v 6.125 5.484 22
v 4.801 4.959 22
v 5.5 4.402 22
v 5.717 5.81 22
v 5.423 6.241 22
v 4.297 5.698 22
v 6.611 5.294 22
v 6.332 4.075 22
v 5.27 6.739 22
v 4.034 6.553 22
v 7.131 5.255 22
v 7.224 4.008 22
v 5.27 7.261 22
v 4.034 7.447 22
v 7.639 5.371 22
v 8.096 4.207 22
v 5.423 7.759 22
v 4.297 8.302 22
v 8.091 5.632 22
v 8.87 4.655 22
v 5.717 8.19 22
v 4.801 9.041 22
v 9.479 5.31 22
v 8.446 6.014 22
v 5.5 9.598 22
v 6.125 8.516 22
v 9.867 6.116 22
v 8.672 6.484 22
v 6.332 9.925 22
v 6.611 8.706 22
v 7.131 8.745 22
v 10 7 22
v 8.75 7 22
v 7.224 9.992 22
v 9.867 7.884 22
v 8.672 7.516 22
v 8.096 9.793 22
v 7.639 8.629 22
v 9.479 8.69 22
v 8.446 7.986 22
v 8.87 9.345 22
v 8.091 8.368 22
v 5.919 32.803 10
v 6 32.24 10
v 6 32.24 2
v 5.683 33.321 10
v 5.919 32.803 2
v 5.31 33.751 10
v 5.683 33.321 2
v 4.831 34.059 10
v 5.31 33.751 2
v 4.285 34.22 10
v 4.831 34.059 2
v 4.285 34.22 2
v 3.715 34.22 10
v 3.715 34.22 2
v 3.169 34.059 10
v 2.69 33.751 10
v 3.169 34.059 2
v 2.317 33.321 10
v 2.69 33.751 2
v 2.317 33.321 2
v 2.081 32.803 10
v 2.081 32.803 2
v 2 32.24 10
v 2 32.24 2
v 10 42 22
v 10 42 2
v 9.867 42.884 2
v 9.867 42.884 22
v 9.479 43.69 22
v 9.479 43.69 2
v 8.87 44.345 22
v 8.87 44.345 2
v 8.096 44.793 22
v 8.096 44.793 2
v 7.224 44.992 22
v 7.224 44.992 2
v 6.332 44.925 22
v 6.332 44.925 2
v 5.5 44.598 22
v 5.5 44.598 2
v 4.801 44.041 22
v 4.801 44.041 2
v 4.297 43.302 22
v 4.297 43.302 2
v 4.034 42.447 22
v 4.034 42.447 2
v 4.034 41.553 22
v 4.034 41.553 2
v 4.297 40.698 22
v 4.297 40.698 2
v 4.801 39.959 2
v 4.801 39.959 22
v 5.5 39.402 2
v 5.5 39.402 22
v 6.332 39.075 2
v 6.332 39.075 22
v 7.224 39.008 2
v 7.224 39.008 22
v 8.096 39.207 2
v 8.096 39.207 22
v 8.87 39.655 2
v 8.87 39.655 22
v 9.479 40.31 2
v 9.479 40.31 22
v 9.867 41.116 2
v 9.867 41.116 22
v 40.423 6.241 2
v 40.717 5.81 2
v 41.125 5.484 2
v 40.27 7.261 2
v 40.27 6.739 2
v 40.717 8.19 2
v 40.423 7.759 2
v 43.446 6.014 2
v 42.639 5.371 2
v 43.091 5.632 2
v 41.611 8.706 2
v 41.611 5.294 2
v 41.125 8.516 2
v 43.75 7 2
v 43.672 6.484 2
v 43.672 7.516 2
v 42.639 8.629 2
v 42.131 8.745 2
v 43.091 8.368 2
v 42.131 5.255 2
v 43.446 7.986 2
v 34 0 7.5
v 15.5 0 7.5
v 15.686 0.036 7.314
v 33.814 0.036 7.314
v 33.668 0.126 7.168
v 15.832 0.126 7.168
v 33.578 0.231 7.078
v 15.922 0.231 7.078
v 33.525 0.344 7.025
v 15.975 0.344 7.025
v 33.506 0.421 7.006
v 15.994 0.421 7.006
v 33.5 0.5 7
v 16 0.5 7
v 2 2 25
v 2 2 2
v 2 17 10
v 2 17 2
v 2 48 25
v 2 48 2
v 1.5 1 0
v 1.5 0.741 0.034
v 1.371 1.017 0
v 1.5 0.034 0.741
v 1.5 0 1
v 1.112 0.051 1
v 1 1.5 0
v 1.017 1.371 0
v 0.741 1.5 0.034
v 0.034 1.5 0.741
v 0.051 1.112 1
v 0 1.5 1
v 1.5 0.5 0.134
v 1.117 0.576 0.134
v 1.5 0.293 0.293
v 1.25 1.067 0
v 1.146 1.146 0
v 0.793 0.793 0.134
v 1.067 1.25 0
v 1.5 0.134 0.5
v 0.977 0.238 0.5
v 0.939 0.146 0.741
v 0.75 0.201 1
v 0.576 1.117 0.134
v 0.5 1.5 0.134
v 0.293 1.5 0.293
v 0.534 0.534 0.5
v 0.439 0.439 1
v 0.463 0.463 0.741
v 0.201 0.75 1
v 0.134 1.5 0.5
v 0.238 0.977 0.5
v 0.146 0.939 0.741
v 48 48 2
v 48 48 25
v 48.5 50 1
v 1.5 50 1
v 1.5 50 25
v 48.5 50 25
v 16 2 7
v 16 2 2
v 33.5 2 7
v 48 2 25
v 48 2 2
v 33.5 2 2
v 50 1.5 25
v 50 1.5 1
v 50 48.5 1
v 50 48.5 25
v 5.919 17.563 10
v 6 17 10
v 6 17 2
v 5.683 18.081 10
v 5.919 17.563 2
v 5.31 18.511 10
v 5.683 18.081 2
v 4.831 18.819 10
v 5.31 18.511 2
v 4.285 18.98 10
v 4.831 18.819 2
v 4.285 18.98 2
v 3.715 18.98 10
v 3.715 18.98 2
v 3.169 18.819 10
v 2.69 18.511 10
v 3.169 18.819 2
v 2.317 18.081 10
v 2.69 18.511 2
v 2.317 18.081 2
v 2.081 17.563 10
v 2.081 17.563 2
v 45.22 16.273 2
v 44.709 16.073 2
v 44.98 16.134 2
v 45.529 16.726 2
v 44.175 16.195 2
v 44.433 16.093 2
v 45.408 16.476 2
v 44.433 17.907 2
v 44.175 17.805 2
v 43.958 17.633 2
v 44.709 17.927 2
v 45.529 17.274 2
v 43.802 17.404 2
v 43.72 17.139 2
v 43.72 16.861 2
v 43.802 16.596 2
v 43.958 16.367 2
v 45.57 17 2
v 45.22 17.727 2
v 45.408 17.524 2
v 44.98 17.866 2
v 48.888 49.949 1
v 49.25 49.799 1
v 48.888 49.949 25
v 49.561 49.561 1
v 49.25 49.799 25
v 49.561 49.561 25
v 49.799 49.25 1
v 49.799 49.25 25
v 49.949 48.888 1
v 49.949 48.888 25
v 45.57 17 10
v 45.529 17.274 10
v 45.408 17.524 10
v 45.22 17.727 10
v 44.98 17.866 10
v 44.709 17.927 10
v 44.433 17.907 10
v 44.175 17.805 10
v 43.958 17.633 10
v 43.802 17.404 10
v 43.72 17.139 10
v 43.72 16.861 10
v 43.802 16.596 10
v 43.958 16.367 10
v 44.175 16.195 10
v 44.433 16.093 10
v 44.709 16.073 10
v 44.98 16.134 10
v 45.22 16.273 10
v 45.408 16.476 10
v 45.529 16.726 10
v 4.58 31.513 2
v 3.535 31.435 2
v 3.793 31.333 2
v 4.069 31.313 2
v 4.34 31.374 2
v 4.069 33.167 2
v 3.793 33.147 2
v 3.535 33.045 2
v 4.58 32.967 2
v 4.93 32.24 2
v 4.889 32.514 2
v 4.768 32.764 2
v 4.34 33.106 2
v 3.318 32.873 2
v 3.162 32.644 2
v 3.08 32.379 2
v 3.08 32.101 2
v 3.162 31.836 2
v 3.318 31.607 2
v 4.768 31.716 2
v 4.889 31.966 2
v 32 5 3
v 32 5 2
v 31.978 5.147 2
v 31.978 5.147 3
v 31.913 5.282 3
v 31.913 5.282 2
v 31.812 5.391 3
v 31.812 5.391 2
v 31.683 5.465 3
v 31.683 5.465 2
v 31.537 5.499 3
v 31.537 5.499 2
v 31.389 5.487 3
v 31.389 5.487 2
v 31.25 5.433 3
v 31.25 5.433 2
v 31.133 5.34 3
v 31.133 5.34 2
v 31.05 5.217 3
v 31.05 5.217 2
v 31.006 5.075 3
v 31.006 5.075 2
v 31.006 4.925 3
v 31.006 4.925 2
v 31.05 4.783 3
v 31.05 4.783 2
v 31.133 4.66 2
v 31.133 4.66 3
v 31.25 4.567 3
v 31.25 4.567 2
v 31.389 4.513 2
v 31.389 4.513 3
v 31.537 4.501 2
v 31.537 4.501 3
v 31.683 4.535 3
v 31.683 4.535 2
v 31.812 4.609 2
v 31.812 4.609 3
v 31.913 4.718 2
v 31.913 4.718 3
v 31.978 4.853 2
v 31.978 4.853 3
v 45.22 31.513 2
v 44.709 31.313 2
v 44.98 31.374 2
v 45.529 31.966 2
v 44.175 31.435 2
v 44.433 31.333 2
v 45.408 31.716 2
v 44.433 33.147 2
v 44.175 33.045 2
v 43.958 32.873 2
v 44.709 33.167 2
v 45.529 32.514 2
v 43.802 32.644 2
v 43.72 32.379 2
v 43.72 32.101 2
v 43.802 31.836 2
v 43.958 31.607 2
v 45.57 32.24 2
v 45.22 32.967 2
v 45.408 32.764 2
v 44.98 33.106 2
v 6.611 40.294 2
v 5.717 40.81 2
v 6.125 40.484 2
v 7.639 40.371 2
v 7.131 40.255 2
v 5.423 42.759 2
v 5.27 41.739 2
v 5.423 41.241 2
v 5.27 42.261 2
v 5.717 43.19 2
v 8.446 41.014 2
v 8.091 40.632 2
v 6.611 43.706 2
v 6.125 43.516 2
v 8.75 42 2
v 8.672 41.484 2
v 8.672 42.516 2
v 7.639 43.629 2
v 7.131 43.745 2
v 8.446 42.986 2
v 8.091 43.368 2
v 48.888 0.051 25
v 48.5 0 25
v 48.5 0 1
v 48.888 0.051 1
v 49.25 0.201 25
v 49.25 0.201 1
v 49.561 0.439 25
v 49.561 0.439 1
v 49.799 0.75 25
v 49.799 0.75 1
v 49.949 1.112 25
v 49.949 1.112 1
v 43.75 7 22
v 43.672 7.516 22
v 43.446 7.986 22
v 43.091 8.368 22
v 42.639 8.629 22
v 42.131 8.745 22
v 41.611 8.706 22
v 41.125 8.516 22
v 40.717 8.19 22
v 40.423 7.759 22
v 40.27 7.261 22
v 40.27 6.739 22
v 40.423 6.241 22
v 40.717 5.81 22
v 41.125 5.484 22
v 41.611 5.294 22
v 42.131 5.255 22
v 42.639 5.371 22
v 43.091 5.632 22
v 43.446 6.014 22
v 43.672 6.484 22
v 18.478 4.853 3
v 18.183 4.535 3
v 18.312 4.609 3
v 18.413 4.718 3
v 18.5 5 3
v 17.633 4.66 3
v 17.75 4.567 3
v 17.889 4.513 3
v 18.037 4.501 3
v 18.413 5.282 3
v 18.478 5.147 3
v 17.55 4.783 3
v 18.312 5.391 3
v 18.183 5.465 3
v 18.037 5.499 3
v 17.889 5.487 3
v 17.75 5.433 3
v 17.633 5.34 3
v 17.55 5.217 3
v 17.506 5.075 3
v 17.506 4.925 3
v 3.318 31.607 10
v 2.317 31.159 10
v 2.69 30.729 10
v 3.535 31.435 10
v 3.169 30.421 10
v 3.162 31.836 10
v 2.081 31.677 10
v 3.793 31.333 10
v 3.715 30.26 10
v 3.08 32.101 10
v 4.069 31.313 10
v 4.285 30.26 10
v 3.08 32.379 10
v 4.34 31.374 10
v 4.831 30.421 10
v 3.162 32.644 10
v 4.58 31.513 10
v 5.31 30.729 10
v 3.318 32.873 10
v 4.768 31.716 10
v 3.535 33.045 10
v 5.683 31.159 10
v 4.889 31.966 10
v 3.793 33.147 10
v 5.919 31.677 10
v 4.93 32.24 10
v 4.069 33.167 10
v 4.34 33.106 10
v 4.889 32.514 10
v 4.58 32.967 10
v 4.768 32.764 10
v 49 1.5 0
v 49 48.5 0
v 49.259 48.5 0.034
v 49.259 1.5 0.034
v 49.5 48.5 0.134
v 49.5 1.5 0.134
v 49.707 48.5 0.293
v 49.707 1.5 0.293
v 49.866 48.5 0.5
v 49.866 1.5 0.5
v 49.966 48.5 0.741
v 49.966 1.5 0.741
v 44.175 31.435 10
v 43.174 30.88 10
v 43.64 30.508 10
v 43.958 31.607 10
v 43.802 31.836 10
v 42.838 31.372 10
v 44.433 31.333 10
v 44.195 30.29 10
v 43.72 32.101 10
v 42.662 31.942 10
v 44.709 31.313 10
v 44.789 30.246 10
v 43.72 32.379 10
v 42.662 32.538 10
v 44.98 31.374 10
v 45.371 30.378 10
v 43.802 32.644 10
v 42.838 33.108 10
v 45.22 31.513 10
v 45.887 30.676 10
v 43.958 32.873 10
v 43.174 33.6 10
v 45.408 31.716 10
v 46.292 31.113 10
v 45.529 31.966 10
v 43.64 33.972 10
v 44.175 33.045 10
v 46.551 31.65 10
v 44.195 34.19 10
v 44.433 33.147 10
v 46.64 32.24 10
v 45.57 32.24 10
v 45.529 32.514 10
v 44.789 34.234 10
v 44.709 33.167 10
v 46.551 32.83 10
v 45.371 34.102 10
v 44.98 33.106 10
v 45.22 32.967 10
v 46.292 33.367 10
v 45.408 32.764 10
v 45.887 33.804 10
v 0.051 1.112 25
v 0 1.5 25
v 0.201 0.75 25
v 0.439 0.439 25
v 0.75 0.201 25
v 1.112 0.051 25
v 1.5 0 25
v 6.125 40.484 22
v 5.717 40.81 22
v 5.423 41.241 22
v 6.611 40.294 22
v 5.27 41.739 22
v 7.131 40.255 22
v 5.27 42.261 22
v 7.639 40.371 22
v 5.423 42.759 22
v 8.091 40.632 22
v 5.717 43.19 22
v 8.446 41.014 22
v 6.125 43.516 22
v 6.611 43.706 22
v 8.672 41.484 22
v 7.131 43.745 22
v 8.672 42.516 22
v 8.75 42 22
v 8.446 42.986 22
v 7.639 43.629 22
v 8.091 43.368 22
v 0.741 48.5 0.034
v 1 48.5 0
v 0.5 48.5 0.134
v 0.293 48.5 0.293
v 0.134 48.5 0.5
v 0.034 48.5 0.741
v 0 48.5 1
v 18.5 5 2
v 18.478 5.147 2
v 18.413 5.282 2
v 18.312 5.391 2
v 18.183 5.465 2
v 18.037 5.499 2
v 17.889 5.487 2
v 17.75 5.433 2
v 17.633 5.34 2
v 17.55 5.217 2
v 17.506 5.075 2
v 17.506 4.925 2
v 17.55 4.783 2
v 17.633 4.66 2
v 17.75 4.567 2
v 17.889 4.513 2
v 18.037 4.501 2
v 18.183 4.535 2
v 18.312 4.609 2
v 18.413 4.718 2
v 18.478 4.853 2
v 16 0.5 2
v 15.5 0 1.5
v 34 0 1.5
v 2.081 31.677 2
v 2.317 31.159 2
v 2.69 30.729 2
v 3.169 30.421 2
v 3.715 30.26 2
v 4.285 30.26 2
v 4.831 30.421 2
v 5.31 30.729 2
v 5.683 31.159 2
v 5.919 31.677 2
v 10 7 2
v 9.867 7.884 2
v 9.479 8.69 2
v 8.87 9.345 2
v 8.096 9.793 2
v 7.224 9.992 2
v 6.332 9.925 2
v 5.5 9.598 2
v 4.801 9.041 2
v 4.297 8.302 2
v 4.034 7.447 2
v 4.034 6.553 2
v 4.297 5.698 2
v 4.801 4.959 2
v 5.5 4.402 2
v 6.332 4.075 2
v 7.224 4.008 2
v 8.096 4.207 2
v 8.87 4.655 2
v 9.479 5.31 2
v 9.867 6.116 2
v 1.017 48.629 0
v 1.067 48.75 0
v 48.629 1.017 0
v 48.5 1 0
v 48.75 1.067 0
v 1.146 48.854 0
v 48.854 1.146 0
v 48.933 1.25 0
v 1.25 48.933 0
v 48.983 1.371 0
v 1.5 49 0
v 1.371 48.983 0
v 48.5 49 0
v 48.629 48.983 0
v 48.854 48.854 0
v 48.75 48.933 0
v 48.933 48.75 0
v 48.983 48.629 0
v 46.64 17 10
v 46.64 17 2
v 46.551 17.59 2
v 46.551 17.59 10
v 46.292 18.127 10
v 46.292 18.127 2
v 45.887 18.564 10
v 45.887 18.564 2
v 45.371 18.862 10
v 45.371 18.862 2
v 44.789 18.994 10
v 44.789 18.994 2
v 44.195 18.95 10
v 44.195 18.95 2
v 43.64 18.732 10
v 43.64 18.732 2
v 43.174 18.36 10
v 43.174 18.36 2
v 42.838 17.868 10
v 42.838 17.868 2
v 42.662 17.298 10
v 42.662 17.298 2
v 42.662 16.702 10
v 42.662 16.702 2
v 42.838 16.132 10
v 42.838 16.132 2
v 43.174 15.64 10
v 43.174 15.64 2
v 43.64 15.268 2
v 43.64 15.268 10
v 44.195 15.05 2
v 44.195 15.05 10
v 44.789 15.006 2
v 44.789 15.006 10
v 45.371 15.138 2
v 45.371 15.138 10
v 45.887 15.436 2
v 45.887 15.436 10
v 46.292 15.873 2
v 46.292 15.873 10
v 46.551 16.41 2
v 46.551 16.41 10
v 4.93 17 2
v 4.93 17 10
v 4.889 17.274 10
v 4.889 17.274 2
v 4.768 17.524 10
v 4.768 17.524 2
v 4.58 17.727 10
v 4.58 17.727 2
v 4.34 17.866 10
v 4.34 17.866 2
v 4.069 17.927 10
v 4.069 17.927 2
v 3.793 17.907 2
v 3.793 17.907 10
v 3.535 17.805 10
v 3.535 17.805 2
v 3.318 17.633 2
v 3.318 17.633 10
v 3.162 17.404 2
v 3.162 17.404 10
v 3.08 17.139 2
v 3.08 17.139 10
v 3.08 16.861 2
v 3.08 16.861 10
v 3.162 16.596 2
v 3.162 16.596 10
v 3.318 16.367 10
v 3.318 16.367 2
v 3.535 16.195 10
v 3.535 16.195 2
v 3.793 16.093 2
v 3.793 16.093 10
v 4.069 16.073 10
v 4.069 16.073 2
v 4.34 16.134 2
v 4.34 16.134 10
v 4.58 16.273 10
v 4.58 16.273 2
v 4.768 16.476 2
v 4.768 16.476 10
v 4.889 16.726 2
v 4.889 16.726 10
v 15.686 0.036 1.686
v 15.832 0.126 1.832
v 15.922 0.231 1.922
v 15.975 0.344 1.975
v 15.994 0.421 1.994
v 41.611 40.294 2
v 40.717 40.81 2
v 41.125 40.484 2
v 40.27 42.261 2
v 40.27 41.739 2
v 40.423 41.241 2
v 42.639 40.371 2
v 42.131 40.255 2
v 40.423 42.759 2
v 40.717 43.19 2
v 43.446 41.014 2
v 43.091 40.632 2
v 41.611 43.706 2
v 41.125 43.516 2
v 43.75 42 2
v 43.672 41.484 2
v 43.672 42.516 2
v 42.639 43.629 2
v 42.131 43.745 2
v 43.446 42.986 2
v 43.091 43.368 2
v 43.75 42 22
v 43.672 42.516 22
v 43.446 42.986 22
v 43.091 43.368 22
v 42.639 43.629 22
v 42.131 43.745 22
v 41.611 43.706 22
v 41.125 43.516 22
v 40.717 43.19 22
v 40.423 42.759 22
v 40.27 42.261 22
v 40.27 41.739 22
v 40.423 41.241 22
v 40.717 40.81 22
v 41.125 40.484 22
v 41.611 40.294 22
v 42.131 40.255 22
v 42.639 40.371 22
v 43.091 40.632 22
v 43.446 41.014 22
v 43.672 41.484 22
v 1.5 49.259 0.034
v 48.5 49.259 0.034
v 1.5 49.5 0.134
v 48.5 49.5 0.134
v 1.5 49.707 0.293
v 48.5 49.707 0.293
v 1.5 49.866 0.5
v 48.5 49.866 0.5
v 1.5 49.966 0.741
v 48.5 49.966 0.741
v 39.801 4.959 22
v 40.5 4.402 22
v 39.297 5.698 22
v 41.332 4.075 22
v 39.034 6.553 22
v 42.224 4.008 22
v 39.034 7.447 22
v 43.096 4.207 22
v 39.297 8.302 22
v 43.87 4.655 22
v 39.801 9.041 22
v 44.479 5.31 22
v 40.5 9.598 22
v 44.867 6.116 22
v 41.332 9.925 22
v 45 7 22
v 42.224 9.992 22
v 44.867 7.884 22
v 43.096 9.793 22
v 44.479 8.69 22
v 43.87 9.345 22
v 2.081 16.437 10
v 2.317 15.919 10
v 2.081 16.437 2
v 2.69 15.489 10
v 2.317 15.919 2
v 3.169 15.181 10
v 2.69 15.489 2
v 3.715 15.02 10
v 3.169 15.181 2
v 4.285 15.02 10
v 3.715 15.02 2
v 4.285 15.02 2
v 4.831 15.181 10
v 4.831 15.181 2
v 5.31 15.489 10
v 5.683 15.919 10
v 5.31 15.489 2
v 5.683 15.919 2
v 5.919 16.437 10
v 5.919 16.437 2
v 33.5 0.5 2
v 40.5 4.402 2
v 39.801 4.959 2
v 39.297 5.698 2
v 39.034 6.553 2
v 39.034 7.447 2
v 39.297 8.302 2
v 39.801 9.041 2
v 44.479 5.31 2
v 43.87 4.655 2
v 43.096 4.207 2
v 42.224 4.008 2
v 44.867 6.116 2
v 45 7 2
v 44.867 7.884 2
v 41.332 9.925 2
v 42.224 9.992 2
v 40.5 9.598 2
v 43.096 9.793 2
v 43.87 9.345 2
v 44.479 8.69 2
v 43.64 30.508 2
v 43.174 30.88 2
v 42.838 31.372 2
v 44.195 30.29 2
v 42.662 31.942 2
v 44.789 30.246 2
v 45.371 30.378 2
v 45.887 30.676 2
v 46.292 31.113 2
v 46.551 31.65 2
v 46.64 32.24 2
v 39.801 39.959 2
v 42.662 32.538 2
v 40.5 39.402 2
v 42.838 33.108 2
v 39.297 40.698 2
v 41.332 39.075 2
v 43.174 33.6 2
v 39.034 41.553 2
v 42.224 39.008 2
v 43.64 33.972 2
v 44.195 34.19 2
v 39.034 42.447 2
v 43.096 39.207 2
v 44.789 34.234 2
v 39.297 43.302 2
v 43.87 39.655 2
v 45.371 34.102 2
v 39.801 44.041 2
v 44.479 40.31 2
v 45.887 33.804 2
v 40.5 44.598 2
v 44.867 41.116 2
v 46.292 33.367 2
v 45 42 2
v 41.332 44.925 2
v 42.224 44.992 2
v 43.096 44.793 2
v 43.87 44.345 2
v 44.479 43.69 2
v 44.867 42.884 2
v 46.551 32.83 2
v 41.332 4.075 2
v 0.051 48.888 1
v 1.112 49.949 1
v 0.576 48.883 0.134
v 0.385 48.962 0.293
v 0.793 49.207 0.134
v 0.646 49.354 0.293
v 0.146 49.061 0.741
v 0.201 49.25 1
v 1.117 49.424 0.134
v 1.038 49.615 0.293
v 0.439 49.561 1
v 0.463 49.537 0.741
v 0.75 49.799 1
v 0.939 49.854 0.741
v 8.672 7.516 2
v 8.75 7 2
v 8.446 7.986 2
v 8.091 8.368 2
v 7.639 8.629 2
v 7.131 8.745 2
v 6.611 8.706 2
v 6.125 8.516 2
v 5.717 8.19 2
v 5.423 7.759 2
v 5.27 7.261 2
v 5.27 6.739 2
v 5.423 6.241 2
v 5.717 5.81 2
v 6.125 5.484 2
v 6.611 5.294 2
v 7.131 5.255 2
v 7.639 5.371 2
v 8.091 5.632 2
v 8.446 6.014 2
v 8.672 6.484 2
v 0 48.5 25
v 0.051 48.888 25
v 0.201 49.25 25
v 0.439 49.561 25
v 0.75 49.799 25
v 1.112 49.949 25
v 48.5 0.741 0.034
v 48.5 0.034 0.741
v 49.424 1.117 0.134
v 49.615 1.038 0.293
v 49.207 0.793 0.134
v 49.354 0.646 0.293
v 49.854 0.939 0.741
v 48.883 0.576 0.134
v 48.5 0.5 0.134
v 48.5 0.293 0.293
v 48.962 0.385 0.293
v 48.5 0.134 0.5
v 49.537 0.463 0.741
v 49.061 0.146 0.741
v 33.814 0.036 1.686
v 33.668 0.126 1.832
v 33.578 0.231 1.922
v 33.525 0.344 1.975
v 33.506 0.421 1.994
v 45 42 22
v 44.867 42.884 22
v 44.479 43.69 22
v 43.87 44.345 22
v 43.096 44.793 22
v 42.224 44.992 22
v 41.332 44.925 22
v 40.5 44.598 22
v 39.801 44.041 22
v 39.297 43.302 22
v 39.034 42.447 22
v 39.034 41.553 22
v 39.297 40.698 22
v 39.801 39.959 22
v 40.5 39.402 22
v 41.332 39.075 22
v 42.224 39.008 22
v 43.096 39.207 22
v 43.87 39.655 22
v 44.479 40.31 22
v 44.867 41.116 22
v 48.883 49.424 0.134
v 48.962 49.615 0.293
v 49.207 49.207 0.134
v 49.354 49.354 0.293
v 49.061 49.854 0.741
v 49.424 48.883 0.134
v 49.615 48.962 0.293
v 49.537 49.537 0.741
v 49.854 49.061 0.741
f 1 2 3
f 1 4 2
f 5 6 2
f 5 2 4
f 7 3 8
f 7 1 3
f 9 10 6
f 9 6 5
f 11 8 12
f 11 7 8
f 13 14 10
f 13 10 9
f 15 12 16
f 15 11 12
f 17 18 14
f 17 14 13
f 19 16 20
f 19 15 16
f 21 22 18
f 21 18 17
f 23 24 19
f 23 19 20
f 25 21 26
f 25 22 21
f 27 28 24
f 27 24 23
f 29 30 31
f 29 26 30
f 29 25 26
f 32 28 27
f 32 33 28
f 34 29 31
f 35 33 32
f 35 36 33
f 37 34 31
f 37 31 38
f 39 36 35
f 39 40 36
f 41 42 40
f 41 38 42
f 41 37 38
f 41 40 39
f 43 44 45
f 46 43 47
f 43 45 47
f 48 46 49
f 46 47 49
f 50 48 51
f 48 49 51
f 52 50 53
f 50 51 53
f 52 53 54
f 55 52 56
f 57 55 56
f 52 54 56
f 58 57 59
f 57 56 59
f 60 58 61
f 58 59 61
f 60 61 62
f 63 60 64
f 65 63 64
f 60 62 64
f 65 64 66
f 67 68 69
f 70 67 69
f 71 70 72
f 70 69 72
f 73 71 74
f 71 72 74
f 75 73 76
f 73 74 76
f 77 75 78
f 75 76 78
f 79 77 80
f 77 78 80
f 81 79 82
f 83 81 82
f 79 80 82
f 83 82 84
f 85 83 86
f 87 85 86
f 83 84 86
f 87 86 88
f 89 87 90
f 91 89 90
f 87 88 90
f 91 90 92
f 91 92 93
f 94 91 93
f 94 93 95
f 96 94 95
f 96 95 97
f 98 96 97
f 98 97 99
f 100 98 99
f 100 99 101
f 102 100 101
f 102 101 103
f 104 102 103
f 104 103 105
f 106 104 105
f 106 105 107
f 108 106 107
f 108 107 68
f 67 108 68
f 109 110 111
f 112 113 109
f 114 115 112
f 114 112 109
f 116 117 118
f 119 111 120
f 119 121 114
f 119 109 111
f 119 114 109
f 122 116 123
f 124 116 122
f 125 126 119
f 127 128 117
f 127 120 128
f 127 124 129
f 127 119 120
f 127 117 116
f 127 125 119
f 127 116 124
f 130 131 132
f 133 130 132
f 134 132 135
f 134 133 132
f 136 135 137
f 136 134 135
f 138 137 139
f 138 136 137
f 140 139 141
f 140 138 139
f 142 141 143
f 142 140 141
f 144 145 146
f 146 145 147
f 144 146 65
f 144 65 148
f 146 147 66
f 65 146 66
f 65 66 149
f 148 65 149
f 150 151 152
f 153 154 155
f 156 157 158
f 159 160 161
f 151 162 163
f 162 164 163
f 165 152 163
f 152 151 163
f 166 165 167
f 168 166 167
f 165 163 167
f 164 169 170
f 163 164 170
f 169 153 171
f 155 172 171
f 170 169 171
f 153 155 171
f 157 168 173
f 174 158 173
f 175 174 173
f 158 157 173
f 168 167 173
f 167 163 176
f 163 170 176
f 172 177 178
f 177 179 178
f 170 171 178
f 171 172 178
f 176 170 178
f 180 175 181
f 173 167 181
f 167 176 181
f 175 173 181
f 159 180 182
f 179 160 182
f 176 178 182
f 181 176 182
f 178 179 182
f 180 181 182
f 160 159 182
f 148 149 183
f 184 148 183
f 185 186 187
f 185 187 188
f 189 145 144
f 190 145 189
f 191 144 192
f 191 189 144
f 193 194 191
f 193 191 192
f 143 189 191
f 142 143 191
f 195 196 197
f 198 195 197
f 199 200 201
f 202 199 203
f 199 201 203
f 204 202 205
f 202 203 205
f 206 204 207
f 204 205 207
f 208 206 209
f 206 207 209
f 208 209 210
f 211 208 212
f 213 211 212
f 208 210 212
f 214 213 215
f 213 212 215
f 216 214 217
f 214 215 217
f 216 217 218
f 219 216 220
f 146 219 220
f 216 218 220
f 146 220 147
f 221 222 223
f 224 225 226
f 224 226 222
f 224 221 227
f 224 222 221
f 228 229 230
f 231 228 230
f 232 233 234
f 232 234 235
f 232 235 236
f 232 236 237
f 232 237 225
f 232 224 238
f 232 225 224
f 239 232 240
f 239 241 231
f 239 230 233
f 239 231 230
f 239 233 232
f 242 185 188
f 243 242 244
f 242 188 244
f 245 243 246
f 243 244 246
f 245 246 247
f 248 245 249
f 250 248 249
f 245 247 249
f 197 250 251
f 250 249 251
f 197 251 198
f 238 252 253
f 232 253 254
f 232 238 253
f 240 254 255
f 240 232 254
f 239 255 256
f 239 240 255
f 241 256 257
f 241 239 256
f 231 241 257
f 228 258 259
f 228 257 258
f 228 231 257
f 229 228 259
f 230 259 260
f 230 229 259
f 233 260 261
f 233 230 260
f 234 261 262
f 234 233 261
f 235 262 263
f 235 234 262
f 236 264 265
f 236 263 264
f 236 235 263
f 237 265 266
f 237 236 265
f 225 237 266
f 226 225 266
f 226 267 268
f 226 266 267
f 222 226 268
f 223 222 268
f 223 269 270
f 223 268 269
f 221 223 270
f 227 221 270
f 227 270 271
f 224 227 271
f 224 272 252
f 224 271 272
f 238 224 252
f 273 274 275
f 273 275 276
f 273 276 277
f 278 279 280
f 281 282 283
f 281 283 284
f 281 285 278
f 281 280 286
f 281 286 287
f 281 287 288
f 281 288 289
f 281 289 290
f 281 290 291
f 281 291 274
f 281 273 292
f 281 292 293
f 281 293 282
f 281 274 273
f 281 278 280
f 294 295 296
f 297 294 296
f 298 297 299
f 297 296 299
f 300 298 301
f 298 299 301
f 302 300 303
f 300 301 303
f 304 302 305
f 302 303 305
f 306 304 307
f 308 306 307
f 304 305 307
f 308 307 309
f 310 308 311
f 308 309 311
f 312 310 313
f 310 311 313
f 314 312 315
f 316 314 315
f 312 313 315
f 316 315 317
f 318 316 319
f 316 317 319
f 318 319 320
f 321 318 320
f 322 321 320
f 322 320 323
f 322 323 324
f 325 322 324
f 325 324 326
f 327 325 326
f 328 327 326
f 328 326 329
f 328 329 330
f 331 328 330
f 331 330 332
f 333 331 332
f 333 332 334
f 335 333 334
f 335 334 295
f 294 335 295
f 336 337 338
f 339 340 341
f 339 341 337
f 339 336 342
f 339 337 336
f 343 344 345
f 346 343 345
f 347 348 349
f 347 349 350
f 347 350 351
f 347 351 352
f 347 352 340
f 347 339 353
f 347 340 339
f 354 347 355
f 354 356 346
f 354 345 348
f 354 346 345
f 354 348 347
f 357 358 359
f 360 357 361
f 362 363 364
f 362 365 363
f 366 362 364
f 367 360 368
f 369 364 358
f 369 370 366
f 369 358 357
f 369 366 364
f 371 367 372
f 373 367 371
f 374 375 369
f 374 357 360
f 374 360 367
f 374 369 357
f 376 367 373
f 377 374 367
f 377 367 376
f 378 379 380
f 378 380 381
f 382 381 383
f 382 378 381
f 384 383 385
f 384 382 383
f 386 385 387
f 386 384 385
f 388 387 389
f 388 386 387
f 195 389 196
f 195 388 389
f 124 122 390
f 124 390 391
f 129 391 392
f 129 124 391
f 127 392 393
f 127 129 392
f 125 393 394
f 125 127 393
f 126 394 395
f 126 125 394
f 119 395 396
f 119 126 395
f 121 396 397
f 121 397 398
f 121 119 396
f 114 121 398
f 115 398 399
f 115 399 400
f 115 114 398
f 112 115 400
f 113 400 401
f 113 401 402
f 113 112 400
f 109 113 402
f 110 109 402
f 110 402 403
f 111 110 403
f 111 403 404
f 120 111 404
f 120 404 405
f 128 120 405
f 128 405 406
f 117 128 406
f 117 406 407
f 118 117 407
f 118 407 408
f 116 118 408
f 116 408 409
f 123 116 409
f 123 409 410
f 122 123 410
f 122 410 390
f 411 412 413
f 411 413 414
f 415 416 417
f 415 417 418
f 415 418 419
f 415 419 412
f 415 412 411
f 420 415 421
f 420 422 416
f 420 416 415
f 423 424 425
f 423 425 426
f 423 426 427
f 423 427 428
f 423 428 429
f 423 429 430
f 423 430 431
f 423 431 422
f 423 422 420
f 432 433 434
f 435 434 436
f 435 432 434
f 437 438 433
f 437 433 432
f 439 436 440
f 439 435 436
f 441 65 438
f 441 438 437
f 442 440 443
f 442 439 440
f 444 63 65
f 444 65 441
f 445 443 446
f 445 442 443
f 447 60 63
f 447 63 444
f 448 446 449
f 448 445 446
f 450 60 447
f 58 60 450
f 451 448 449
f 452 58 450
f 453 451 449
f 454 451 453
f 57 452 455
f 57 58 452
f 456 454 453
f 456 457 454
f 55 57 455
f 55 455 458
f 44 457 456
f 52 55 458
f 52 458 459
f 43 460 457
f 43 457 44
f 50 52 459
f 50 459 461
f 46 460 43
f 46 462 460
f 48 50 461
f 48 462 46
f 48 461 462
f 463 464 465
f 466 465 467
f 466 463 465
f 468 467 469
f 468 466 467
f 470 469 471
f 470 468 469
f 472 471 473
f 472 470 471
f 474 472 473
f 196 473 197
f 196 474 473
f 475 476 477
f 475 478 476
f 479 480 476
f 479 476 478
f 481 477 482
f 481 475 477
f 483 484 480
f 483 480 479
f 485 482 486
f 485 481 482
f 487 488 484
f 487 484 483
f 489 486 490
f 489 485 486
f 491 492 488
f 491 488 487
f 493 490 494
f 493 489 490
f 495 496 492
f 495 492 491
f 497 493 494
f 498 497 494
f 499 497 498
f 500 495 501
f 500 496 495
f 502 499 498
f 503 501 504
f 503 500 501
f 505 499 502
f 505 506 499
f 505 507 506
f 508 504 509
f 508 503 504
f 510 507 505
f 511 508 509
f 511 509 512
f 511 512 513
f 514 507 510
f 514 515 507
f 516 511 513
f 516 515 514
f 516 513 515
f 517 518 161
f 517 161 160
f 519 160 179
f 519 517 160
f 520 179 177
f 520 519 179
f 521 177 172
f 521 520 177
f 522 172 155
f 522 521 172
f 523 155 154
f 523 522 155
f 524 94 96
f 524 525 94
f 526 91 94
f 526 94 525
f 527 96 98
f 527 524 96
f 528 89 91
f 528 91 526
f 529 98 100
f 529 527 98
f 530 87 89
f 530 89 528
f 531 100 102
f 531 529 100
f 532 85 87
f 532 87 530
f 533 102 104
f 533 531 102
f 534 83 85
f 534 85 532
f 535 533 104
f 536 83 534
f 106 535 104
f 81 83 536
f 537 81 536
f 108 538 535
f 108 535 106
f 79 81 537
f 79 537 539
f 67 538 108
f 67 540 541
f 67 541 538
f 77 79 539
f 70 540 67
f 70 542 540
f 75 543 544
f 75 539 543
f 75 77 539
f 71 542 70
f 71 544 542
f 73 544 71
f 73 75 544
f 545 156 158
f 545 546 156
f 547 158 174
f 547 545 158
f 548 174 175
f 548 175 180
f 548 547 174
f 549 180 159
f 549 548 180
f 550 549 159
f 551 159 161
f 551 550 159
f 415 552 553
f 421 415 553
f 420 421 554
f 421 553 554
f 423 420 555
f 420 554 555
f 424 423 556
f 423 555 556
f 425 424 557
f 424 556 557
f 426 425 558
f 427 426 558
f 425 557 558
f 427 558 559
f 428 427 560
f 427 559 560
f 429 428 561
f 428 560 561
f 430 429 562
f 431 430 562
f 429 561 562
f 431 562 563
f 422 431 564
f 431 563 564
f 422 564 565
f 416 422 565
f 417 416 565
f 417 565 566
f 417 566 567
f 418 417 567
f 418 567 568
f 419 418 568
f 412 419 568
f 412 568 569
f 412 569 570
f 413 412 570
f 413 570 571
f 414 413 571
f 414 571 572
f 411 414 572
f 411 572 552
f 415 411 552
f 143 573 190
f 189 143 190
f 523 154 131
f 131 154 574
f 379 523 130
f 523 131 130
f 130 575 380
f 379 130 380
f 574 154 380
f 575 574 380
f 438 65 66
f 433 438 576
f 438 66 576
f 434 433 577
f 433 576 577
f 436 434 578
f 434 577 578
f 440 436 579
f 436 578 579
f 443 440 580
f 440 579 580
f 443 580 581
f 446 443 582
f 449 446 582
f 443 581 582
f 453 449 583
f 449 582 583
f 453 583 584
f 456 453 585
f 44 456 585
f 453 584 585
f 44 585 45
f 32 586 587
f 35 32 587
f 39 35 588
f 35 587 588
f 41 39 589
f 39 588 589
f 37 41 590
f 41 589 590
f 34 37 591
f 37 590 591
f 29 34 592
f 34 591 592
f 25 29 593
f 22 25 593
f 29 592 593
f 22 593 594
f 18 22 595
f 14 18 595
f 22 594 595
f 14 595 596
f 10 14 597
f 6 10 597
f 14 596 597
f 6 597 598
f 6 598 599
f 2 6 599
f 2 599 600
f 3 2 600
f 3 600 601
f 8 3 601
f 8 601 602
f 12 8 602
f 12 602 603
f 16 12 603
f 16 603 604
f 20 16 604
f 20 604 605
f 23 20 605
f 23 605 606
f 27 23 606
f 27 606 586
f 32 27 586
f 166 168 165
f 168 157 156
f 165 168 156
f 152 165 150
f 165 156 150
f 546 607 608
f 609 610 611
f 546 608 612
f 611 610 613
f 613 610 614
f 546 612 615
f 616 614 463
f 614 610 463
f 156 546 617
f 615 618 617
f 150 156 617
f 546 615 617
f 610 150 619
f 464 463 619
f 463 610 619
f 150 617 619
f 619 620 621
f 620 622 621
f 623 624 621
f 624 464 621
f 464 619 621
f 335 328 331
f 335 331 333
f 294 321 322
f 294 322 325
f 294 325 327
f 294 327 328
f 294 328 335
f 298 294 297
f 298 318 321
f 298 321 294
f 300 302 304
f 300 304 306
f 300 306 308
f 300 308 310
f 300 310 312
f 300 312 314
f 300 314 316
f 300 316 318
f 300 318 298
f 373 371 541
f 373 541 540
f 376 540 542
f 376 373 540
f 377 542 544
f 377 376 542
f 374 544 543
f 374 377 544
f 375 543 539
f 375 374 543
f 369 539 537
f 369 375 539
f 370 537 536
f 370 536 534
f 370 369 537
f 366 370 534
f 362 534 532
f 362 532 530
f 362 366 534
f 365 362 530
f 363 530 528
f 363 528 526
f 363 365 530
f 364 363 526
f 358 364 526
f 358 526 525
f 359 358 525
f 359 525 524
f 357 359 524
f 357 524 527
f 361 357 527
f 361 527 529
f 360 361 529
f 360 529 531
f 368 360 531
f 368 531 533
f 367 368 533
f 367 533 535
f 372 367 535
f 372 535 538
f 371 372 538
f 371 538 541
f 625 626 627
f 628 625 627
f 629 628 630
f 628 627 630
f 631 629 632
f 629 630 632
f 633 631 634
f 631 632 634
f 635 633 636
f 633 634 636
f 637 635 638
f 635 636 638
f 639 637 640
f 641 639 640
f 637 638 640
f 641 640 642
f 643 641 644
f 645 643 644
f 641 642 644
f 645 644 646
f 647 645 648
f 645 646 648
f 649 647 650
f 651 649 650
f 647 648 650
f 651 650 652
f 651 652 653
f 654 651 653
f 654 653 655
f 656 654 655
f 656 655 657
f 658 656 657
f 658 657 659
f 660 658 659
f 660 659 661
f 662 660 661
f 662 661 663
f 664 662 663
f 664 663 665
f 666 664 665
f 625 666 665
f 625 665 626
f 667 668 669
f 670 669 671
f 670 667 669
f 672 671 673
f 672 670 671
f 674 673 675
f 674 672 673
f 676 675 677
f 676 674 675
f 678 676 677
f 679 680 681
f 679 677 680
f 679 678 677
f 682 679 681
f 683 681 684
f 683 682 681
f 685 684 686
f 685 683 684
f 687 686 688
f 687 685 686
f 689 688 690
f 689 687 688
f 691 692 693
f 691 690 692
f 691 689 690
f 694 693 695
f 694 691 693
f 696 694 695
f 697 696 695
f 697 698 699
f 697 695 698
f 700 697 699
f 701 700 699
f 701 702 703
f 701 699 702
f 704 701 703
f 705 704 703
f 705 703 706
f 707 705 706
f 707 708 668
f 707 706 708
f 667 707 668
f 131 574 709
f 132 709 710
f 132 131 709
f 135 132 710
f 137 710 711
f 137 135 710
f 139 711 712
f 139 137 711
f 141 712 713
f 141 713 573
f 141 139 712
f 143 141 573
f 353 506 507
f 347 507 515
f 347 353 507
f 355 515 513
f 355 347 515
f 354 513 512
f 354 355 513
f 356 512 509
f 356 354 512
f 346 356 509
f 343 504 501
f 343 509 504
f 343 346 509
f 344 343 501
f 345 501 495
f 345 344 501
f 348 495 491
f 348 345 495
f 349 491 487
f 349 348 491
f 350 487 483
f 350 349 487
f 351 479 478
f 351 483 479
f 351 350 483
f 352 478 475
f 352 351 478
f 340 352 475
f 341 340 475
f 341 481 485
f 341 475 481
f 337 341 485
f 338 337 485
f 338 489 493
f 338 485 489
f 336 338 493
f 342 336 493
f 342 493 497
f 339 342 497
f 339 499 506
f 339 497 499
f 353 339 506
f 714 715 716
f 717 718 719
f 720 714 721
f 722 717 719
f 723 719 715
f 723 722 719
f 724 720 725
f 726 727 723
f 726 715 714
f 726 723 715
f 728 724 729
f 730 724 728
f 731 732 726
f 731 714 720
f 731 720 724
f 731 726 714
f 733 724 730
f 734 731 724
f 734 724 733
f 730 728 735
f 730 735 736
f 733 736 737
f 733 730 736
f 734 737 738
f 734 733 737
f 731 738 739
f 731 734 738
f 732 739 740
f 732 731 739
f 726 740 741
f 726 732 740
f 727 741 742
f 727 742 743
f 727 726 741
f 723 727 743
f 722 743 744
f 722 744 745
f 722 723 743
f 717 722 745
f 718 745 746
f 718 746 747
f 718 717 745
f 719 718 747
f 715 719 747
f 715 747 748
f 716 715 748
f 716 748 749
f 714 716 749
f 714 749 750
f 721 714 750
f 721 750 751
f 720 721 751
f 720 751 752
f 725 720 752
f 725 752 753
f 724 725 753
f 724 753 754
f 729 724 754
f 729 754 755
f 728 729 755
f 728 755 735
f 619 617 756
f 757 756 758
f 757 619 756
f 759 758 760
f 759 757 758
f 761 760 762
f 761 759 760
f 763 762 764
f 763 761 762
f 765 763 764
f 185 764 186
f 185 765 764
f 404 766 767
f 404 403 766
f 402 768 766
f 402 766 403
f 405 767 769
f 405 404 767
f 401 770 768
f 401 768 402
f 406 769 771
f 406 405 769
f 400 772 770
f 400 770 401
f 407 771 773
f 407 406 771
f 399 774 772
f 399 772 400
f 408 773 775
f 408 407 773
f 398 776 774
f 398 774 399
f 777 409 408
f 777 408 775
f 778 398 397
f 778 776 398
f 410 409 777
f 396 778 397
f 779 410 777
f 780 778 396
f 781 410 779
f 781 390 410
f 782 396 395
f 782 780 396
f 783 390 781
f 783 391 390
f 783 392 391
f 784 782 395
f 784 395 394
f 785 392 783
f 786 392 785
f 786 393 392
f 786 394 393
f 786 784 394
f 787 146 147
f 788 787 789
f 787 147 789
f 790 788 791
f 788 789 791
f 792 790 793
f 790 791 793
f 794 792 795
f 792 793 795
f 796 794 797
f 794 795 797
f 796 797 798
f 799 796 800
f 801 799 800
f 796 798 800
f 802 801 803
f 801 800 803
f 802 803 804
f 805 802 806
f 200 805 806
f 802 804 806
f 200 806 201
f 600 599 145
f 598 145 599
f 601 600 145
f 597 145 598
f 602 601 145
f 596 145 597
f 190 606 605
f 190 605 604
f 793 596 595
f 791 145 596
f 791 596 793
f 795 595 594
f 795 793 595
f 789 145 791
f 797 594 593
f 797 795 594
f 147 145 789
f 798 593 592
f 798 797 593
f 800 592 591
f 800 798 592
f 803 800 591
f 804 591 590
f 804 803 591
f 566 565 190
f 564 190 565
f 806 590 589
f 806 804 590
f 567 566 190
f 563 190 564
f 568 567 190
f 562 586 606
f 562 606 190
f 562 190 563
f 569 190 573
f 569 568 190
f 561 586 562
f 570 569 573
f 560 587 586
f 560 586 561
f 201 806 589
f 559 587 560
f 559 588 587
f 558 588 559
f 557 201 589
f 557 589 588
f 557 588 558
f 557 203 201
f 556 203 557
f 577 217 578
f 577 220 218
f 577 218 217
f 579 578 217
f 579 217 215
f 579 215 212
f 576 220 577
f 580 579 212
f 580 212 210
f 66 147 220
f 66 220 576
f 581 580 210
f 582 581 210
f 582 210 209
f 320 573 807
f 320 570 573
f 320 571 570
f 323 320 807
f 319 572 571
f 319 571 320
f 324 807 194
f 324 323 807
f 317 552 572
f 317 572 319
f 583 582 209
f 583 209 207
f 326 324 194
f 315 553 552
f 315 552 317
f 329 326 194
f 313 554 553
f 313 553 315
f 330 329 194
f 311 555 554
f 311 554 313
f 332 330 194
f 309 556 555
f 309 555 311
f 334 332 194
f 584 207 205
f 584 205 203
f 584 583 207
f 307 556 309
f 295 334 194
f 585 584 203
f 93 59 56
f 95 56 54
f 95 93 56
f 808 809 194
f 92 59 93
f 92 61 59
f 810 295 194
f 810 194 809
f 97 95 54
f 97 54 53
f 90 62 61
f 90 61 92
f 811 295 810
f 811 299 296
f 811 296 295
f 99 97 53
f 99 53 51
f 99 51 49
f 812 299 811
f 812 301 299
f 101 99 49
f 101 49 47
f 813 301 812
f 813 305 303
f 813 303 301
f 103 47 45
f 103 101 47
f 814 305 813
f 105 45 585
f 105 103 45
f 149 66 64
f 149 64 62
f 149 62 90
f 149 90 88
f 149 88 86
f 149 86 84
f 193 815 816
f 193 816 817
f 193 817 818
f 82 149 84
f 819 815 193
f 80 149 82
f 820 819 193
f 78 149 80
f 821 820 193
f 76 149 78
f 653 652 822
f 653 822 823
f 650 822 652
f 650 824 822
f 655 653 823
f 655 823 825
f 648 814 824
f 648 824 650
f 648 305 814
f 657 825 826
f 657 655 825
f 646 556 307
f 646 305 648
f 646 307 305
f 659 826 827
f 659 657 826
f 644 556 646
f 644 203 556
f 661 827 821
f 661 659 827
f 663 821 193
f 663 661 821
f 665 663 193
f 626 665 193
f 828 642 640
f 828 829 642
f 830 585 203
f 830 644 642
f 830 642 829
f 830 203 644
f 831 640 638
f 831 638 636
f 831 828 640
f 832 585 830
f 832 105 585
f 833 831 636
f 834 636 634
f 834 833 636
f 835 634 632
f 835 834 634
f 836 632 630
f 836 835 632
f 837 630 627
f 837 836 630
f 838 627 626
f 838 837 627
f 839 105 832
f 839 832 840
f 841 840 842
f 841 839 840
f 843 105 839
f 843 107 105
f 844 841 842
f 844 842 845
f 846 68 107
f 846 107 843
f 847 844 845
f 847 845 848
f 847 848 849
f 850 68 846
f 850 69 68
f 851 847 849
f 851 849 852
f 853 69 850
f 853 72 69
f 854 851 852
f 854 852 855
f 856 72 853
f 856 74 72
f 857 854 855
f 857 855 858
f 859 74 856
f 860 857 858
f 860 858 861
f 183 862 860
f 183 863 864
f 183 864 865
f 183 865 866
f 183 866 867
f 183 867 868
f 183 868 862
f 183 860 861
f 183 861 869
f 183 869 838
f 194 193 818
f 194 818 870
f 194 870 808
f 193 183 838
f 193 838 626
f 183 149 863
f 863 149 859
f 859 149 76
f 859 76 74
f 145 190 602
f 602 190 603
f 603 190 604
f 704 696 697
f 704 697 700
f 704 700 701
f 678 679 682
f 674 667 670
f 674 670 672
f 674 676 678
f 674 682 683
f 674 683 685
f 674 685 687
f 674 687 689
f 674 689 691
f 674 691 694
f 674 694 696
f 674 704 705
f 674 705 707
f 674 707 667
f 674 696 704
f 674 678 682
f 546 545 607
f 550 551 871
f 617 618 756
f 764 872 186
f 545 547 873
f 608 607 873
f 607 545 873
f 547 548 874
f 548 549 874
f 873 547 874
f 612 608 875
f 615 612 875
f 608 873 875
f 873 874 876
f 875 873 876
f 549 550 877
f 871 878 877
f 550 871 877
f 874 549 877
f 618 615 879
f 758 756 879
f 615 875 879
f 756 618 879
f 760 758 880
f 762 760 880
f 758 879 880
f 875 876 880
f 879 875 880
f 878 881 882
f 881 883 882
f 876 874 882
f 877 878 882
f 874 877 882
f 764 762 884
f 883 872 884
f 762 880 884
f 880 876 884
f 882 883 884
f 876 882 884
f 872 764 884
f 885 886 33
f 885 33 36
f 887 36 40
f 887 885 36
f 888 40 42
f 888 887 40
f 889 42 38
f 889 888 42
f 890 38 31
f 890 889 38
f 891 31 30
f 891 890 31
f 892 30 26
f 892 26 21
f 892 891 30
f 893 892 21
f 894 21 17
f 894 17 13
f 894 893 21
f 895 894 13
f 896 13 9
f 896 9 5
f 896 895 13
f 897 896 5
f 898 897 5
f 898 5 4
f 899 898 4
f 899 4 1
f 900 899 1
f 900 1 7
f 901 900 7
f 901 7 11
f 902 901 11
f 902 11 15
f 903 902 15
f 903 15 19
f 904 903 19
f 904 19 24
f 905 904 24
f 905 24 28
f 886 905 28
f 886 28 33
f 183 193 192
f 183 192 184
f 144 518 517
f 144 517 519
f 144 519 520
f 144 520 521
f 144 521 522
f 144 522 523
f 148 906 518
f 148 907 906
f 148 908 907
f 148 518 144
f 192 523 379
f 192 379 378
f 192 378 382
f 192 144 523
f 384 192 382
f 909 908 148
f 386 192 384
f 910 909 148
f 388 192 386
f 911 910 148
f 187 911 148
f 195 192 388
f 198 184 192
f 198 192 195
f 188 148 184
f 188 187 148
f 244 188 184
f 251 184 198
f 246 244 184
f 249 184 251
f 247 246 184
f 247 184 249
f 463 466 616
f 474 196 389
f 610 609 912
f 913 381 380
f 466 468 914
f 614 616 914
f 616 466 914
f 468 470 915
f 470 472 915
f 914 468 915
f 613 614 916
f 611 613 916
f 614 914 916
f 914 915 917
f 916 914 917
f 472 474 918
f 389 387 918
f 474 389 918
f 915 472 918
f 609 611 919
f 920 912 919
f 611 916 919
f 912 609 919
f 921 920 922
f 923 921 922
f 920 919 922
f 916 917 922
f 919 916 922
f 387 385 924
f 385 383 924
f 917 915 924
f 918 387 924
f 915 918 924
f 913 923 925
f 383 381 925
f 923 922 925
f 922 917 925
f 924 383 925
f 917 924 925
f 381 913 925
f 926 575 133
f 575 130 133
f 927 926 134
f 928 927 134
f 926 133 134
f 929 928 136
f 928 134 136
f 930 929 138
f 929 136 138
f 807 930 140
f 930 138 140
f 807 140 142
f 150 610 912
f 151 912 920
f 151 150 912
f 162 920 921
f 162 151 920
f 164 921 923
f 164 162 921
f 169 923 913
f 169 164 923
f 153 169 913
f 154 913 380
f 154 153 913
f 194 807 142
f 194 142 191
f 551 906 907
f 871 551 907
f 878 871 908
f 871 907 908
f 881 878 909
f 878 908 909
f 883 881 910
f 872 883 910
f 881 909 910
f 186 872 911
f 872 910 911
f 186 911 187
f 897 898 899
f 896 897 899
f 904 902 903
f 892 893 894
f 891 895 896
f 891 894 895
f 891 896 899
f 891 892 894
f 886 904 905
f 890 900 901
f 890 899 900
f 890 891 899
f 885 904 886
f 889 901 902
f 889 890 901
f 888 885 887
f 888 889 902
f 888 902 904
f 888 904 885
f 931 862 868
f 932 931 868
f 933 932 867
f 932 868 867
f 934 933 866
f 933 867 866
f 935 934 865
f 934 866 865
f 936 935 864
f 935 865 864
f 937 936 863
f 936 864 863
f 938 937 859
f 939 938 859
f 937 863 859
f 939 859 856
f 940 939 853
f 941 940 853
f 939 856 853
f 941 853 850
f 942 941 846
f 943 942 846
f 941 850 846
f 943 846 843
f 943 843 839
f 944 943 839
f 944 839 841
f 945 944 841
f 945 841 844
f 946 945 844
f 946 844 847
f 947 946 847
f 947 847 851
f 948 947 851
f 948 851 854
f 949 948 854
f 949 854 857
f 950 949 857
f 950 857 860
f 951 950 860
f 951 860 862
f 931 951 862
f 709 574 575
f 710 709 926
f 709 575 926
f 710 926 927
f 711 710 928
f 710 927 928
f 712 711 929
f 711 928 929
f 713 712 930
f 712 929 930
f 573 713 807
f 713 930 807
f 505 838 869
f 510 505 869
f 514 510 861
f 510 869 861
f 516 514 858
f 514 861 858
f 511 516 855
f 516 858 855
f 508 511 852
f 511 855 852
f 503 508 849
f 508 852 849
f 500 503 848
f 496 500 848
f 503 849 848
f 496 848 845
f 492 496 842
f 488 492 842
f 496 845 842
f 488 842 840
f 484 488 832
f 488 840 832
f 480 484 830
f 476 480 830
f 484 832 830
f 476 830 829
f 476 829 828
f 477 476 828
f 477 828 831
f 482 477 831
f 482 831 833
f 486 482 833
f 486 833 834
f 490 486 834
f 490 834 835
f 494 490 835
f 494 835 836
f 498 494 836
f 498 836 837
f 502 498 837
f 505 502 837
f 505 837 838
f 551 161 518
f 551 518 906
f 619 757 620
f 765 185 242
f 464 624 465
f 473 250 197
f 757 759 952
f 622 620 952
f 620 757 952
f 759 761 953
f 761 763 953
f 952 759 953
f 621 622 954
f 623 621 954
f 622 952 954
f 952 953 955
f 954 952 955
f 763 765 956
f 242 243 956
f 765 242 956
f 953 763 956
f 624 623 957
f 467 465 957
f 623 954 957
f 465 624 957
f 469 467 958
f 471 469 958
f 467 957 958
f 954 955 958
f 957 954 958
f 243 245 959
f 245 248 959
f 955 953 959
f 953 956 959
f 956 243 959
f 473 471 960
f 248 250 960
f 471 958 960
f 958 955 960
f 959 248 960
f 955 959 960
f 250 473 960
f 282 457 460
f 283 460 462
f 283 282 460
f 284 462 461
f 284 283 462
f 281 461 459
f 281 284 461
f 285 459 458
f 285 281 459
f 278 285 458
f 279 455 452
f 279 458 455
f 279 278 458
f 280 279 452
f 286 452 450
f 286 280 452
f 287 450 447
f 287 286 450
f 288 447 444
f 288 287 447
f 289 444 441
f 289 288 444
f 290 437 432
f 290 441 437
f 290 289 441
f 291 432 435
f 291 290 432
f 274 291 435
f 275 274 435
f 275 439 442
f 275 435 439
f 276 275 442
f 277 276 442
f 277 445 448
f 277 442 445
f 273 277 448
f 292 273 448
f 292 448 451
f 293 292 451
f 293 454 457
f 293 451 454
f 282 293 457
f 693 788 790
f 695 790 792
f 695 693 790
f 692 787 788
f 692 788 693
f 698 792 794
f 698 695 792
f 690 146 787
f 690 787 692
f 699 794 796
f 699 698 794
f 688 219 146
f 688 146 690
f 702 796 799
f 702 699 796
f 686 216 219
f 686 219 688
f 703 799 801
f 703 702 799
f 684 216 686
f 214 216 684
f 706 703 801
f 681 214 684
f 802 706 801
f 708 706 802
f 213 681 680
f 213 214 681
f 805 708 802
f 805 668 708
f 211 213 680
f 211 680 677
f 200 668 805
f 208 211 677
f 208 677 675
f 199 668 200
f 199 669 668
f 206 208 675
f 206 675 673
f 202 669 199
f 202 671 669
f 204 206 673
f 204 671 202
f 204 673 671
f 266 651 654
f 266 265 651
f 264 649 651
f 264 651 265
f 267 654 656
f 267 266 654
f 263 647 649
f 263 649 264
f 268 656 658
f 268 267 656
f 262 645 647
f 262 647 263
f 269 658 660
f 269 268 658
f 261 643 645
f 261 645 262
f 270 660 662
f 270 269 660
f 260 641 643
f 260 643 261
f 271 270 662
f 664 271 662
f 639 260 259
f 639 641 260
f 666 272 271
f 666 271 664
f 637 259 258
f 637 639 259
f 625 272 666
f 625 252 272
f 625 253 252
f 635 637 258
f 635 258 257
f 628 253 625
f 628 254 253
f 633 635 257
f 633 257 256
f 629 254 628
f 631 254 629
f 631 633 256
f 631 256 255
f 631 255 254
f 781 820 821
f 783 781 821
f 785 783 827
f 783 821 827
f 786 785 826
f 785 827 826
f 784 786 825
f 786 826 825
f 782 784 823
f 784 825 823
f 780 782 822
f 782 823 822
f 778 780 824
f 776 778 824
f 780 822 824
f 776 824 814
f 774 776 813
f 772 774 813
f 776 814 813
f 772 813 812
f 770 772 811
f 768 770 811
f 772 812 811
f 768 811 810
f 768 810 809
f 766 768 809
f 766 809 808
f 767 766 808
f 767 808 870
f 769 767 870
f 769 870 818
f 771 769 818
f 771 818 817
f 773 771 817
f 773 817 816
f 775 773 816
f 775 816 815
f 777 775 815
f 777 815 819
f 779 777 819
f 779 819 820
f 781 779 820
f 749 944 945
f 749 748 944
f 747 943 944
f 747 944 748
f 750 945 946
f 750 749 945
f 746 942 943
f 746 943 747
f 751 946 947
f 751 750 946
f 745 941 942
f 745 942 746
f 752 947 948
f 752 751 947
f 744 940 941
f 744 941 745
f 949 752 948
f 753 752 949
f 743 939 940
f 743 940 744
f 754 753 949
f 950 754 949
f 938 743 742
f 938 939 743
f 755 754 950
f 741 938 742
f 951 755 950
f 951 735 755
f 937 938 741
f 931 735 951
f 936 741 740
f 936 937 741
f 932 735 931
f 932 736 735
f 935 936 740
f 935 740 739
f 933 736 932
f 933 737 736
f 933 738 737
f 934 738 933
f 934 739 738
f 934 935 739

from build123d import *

# Parameters (mm, degrees)
CYLINDER016_R     = 1.75
CYLINDER016_DEPTH = 22
CYLINDER017_R     = 3
CYLINDER017_DEPTH = 22
CYLINDER015_R     = 1.75
CYLINDER015_DEPTH = 22
CYLINDER014_R     = 3
CYLINDER014_DEPTH = 22
CYLINDER013_R     = 1.75
CYLINDER013_DEPTH = 22
CYLINDER012_R     = 3
CYLINDER012_DEPTH = 22
CYLINDER011_R     = 1.75
CYLINDER011_DEPTH = 22
CYLINDER010_R     = 3
CYLINDER010_DEPTH = 22
CYLINDER009_R     = 0.5
CYLINDER009_DEPTH = 2
CYLINDER008_R     = 0.5
CYLINDER008_DEPTH = 2
BOX002_W          = 17.5
BOX002_H          = 10
BOX002_DEPTH      = 5
CYLINDER006_R     = 0.93
CYLINDER006_DEPTH = 10
CYLINDER007_R     = 2
CYLINDER007_DEPTH = 10
CYLINDER005_R     = 0.93
CYLINDER005_DEPTH = 10
CYLINDER004_R     = 2
CYLINDER004_DEPTH = 10
CYLINDER003_R     = 0.93
CYLINDER003_DEPTH = 10
CYLINDER002_R     = 2
CYLINDER002_DEPTH = 10
CYLINDER001_R     = 0.93
CYLINDER001_DEPTH = 10
CYLINDER_R        = 2
CYLINDER_DEPTH    = 10
BOX001_W          = 46
BOX001_H          = 46
BOX001_DEPTH      = 25
BOX_W             = 50
BOX_H             = 50
BOX_DEPTH         = 25
FILLET_R          = 1.5
FILLET001_R       = 1
FILLET002_R       = 0.5


with BuildPart() as cylinder008:
    # Cylinder016 → Cylinder016 (new body)
    with BuildSketch(Plane.XY):
        Circle(CYLINDER016_R)
    extrude(amount=CYLINDER016_DEPTH)


with BuildPart() as cut008:
    # Cylinder017 → Cylinder017 (new body)
    with BuildSketch(Plane.XY):
        Circle(CYLINDER017_R)
    extrude(amount=CYLINDER017_DEPTH)

    # Cut008: cut Cylinder008
    add(cylinder008.part, mode=Mode.SUBTRACT)


with BuildPart() as cut008_1:
    # Cut008 placement: moved
    add(cut008.part.moved(Location((41, 35, 0))))


with BuildPart() as cylinder007:
    # Cylinder015 → Cylinder015 (new body)
    with BuildSketch(Plane.XY):
        Circle(CYLINDER015_R)
    extrude(amount=CYLINDER015_DEPTH)


with BuildPart() as fusion007:
    # Cylinder014 → Cylinder014 (new body)
    with BuildSketch(Plane.XY):
        Circle(CYLINDER014_R)
    extrude(amount=CYLINDER014_DEPTH)

    # Cut009: cut Cylinder007
    add(cylinder007.part, mode=Mode.SUBTRACT)


with BuildPart() as fusion007_1:
    # Cut009 placement: moved
    add(fusion007.part.moved(Location((6, 35, 0))))

    # Fusion007: union Cut008
    add(cut008_1.part)


with BuildPart() as fusion007_2:
    # Fusion007 placement: moved
    add(fusion007_1.part.moved(Location((0, -35, 0))))


with BuildPart() as cylinder005:
    # Cylinder013 → Cylinder013 (new body)
    with BuildSketch(Plane.XY):
        Circle(CYLINDER013_R)
    extrude(amount=CYLINDER013_DEPTH)


with BuildPart() as cut007:
    # Cylinder012 → Cylinder012 (new body)
    with BuildSketch(Plane.XY):
        Circle(CYLINDER012_R)
    extrude(amount=CYLINDER012_DEPTH)

    # Cut007: cut Cylinder005
    add(cylinder005.part, mode=Mode.SUBTRACT)


with BuildPart() as cut007_1:
    # Cut007 placement: moved
    add(cut007.part.moved(Location((41, 35, 0))))


with BuildPart() as cylinder003:
    # Cylinder011 → Cylinder011 (new body)
    with BuildSketch(Plane.XY):
        Circle(CYLINDER011_R)
    extrude(amount=CYLINDER011_DEPTH)


with BuildPart() as pcb_platform:
    # Cylinder010 → Cylinder010 (new body)
    with BuildSketch(Plane.XY):
        Circle(CYLINDER010_R)
    extrude(amount=CYLINDER010_DEPTH)

    # Cut006: cut Cylinder003
    add(cylinder003.part, mode=Mode.SUBTRACT)


with BuildPart() as pcb_platform_1:
    # Cut006 placement: moved
    add(pcb_platform.part.moved(Location((6, 35, 0))))

    # Fusion005: union Cut007
    add(cut007_1.part)

    # Fusion008: union Fusion007
    add(fusion007_2.part)


with BuildPart() as pcb_platform_2:
    # Fusion008 placement: moved
    add(pcb_platform_1.part.moved(Location((1, 7, 0))))


with BuildPart() as cylinder001:
    # Cylinder009 → Cylinder009 (new body)
    with BuildSketch(Plane(origin=(13.5, 0, 0), x_dir=(1, 0, 0), z_dir=(0, 0, 1))):
        Circle(CYLINDER009_R)
    extrude(amount=CYLINDER009_DEPTH)


with BuildPart() as fusion004:
    # Cylinder008 → Cylinder008 (new body)
    with BuildSketch(Plane.XY):
        Circle(CYLINDER008_R)
    extrude(amount=CYLINDER008_DEPTH)

    # Fusion004: union Cylinder001
    add(cylinder001.part)


with BuildPart() as fusion004_1:
    # Fusion004 placement: moved
    add(fusion004.part.moved(Location((18, 5, 1))))


with BuildPart() as cube:
    # Box002 → Box002 (new body)
    with BuildSketch(Plane(origin=(16, 0, 2), x_dir=(1, 0, 0), z_dir=(0, 0, 1))):
        with Locations((8.75, 5)):
            Rectangle(BOX002_W, BOX002_H)
    extrude(amount=BOX002_DEPTH)


with BuildPart() as sylinteri006:
    # Cylinder006 → Cylinder006 (new body)
    with BuildSketch(Plane(origin=(7, 10, 2), x_dir=(1, 0, 0), z_dir=(0, 0, 1))):
        Circle(CYLINDER006_R)
    extrude(amount=CYLINDER006_DEPTH)


with BuildPart() as nanoplatorm003:
    # Cylinder007 → Cylinder007 (new body)
    with BuildSketch(Plane(origin=(7, 10, 0), x_dir=(1, 0, 0), z_dir=(0, 0, 1))):
        Circle(CYLINDER007_R)
    extrude(amount=CYLINDER007_DEPTH)

    # Cut004: cut Sylinteri006
    add(sylinteri006.part, mode=Mode.SUBTRACT)


with BuildPart() as nanoplatorm003_1:
    # Cut004 placement: moved
    add(nanoplatorm003.part.moved(Location((37.64, 14.24, 0))))


with BuildPart() as sylinteri005:
    # Cylinder005 → Cylinder005 (new body)
    with BuildSketch(Plane(origin=(7, 10, 2), x_dir=(1, 0, 0), z_dir=(0, 0, 1))):
        Circle(CYLINDER005_R)
    extrude(amount=CYLINDER005_DEPTH)


with BuildPart() as fusion001:
    # Cylinder004 → Cylinder004 (new body)
    with BuildSketch(Plane(origin=(7, 10, 0), x_dir=(1, 0, 0), z_dir=(0, 0, 1))):
        Circle(CYLINDER004_R)
    extrude(amount=CYLINDER004_DEPTH)

    # Cut003: cut Sylinteri005
    add(sylinteri005.part, mode=Mode.SUBTRACT)


with BuildPart() as fusion001_1:
    # Cut003 placement: moved
    add(fusion001.part.moved(Location((37.64, -1, 0))))

    # Fusion001: union NanoPlatorm003
    add(nanoplatorm003_1.part)


with BuildPart() as sylinteri003:
    # Cylinder003 → Cylinder003 (new body)
    with BuildSketch(Plane(origin=(7, 10, 2), x_dir=(1, 0, 0), z_dir=(0, 0, 1))):
        Circle(CYLINDER003_R)
    extrude(amount=CYLINDER003_DEPTH)


with BuildPart() as nanoplatorm001:
    # Cylinder002 → Cylinder002 (new body)
    with BuildSketch(Plane(origin=(7, 10, 0), x_dir=(1, 0, 0), z_dir=(0, 0, 1))):
        Circle(CYLINDER002_R)
    extrude(amount=CYLINDER002_DEPTH)

    # Cut002: cut Sylinteri003
    add(sylinteri003.part, mode=Mode.SUBTRACT)


with BuildPart() as nanoplatorm001_1:
    # Cut002 placement: moved
    add(nanoplatorm001.part.moved(Location((-3, 14.24, 0))))


with BuildPart() as sylinteri001:
    # Cylinder001 → Cylinder001 (new body)
    with BuildSketch(Plane(origin=(7, 10, 2), x_dir=(1, 0, 0), z_dir=(0, 0, 1))):
        Circle(CYLINDER001_R)
    extrude(amount=CYLINDER001_DEPTH)


with BuildPart() as nanoplatform:
    # Cylinder → Cylinder (new body)
    with BuildSketch(Plane(origin=(7, 10, 0), x_dir=(1, 0, 0), z_dir=(0, 0, 1))):
        Circle(CYLINDER_R)
    extrude(amount=CYLINDER_DEPTH)

    # Cut001: cut Sylinteri001
    add(sylinteri001.part, mode=Mode.SUBTRACT)


with BuildPart() as nanoplatform_1:
    # Cut001 placement: moved
    add(nanoplatform.part.moved(Location((-3, -1, 0))))

    # Fusion: union NanoPlatorm001
    add(nanoplatorm001_1.part)

    # Fusion002: union Fusion001
    add(fusion001_1.part)


with BuildPart() as nanoplatform_2:
    # Fusion002 placement: moved
    add(nanoplatform_1.part.moved(Location((0, 8, 0))))


with BuildPart() as f_46x36x15:
    # Box001 → Box001 (new body)
    with BuildSketch(Plane(origin=(2, 2, 2), x_dir=(1, 0, 0), z_dir=(0, 0, 1))):
        with Locations((23, 23)):
            Rectangle(BOX001_W, BOX001_H)
    extrude(amount=BOX001_DEPTH)


with BuildPart() as fillet002:
    # Box → Box (new body)
    with BuildSketch(Plane.XY):
        with Locations((25, 25)):
            Rectangle(BOX_W, BOX_H)
    extrude(amount=BOX_DEPTH)

    # Cut: cut 46x36x15
    add(f_46x36x15.part, mode=Mode.SUBTRACT)

    # Fusion003: union NanoPlatform
    add(nanoplatform_2.part)

    # Cut005: cut Cube
    add(cube.part, mode=Mode.SUBTRACT)

    # Fusion006: union Fusion004
    add(fusion004_1.part)

    # Fusion009: union PCB_Platform
    add(pcb_platform_2.part)

    # Fillet
    fillet_edges = [fillet002.edges().sort_by_distance(p)[0] for p in [
        (0, 0, 12.5),
        (0, 50, 12.5),
        (50, 0, 12.5),
        (50, 50, 12.5),
    ]]
    fillet(fillet_edges, radius=FILLET_R)

    # Fillet001
    fillet001_edges = [fillet002.edges().sort_by_distance(p)[0] for p in [
        (0, 25, 0),
        (0.43934, 0.43934, 0),
        (0.43934, 49.56066, 0),
        (25, 0, 0),
        (25, 50, 0),
        (49.56066, 0.43934, 0),
        (49.56066, 49.56066, 0),
        (50, 25, 0),
    ]]
    fillet(fillet001_edges, radius=FILLET001_R)

    # Fillet002
    fillet002_edges = [fillet002.edges().sort_by_distance(p)[0] for p in [
        (24.75, 0, 7),
        (33.5, 0, 4.5),
        (24.75, 0, 2),
        (16, 0, 4.5),
    ]]
    fillet(fillet002_edges, radius=FILLET002_R)


solid = fillet002.part
